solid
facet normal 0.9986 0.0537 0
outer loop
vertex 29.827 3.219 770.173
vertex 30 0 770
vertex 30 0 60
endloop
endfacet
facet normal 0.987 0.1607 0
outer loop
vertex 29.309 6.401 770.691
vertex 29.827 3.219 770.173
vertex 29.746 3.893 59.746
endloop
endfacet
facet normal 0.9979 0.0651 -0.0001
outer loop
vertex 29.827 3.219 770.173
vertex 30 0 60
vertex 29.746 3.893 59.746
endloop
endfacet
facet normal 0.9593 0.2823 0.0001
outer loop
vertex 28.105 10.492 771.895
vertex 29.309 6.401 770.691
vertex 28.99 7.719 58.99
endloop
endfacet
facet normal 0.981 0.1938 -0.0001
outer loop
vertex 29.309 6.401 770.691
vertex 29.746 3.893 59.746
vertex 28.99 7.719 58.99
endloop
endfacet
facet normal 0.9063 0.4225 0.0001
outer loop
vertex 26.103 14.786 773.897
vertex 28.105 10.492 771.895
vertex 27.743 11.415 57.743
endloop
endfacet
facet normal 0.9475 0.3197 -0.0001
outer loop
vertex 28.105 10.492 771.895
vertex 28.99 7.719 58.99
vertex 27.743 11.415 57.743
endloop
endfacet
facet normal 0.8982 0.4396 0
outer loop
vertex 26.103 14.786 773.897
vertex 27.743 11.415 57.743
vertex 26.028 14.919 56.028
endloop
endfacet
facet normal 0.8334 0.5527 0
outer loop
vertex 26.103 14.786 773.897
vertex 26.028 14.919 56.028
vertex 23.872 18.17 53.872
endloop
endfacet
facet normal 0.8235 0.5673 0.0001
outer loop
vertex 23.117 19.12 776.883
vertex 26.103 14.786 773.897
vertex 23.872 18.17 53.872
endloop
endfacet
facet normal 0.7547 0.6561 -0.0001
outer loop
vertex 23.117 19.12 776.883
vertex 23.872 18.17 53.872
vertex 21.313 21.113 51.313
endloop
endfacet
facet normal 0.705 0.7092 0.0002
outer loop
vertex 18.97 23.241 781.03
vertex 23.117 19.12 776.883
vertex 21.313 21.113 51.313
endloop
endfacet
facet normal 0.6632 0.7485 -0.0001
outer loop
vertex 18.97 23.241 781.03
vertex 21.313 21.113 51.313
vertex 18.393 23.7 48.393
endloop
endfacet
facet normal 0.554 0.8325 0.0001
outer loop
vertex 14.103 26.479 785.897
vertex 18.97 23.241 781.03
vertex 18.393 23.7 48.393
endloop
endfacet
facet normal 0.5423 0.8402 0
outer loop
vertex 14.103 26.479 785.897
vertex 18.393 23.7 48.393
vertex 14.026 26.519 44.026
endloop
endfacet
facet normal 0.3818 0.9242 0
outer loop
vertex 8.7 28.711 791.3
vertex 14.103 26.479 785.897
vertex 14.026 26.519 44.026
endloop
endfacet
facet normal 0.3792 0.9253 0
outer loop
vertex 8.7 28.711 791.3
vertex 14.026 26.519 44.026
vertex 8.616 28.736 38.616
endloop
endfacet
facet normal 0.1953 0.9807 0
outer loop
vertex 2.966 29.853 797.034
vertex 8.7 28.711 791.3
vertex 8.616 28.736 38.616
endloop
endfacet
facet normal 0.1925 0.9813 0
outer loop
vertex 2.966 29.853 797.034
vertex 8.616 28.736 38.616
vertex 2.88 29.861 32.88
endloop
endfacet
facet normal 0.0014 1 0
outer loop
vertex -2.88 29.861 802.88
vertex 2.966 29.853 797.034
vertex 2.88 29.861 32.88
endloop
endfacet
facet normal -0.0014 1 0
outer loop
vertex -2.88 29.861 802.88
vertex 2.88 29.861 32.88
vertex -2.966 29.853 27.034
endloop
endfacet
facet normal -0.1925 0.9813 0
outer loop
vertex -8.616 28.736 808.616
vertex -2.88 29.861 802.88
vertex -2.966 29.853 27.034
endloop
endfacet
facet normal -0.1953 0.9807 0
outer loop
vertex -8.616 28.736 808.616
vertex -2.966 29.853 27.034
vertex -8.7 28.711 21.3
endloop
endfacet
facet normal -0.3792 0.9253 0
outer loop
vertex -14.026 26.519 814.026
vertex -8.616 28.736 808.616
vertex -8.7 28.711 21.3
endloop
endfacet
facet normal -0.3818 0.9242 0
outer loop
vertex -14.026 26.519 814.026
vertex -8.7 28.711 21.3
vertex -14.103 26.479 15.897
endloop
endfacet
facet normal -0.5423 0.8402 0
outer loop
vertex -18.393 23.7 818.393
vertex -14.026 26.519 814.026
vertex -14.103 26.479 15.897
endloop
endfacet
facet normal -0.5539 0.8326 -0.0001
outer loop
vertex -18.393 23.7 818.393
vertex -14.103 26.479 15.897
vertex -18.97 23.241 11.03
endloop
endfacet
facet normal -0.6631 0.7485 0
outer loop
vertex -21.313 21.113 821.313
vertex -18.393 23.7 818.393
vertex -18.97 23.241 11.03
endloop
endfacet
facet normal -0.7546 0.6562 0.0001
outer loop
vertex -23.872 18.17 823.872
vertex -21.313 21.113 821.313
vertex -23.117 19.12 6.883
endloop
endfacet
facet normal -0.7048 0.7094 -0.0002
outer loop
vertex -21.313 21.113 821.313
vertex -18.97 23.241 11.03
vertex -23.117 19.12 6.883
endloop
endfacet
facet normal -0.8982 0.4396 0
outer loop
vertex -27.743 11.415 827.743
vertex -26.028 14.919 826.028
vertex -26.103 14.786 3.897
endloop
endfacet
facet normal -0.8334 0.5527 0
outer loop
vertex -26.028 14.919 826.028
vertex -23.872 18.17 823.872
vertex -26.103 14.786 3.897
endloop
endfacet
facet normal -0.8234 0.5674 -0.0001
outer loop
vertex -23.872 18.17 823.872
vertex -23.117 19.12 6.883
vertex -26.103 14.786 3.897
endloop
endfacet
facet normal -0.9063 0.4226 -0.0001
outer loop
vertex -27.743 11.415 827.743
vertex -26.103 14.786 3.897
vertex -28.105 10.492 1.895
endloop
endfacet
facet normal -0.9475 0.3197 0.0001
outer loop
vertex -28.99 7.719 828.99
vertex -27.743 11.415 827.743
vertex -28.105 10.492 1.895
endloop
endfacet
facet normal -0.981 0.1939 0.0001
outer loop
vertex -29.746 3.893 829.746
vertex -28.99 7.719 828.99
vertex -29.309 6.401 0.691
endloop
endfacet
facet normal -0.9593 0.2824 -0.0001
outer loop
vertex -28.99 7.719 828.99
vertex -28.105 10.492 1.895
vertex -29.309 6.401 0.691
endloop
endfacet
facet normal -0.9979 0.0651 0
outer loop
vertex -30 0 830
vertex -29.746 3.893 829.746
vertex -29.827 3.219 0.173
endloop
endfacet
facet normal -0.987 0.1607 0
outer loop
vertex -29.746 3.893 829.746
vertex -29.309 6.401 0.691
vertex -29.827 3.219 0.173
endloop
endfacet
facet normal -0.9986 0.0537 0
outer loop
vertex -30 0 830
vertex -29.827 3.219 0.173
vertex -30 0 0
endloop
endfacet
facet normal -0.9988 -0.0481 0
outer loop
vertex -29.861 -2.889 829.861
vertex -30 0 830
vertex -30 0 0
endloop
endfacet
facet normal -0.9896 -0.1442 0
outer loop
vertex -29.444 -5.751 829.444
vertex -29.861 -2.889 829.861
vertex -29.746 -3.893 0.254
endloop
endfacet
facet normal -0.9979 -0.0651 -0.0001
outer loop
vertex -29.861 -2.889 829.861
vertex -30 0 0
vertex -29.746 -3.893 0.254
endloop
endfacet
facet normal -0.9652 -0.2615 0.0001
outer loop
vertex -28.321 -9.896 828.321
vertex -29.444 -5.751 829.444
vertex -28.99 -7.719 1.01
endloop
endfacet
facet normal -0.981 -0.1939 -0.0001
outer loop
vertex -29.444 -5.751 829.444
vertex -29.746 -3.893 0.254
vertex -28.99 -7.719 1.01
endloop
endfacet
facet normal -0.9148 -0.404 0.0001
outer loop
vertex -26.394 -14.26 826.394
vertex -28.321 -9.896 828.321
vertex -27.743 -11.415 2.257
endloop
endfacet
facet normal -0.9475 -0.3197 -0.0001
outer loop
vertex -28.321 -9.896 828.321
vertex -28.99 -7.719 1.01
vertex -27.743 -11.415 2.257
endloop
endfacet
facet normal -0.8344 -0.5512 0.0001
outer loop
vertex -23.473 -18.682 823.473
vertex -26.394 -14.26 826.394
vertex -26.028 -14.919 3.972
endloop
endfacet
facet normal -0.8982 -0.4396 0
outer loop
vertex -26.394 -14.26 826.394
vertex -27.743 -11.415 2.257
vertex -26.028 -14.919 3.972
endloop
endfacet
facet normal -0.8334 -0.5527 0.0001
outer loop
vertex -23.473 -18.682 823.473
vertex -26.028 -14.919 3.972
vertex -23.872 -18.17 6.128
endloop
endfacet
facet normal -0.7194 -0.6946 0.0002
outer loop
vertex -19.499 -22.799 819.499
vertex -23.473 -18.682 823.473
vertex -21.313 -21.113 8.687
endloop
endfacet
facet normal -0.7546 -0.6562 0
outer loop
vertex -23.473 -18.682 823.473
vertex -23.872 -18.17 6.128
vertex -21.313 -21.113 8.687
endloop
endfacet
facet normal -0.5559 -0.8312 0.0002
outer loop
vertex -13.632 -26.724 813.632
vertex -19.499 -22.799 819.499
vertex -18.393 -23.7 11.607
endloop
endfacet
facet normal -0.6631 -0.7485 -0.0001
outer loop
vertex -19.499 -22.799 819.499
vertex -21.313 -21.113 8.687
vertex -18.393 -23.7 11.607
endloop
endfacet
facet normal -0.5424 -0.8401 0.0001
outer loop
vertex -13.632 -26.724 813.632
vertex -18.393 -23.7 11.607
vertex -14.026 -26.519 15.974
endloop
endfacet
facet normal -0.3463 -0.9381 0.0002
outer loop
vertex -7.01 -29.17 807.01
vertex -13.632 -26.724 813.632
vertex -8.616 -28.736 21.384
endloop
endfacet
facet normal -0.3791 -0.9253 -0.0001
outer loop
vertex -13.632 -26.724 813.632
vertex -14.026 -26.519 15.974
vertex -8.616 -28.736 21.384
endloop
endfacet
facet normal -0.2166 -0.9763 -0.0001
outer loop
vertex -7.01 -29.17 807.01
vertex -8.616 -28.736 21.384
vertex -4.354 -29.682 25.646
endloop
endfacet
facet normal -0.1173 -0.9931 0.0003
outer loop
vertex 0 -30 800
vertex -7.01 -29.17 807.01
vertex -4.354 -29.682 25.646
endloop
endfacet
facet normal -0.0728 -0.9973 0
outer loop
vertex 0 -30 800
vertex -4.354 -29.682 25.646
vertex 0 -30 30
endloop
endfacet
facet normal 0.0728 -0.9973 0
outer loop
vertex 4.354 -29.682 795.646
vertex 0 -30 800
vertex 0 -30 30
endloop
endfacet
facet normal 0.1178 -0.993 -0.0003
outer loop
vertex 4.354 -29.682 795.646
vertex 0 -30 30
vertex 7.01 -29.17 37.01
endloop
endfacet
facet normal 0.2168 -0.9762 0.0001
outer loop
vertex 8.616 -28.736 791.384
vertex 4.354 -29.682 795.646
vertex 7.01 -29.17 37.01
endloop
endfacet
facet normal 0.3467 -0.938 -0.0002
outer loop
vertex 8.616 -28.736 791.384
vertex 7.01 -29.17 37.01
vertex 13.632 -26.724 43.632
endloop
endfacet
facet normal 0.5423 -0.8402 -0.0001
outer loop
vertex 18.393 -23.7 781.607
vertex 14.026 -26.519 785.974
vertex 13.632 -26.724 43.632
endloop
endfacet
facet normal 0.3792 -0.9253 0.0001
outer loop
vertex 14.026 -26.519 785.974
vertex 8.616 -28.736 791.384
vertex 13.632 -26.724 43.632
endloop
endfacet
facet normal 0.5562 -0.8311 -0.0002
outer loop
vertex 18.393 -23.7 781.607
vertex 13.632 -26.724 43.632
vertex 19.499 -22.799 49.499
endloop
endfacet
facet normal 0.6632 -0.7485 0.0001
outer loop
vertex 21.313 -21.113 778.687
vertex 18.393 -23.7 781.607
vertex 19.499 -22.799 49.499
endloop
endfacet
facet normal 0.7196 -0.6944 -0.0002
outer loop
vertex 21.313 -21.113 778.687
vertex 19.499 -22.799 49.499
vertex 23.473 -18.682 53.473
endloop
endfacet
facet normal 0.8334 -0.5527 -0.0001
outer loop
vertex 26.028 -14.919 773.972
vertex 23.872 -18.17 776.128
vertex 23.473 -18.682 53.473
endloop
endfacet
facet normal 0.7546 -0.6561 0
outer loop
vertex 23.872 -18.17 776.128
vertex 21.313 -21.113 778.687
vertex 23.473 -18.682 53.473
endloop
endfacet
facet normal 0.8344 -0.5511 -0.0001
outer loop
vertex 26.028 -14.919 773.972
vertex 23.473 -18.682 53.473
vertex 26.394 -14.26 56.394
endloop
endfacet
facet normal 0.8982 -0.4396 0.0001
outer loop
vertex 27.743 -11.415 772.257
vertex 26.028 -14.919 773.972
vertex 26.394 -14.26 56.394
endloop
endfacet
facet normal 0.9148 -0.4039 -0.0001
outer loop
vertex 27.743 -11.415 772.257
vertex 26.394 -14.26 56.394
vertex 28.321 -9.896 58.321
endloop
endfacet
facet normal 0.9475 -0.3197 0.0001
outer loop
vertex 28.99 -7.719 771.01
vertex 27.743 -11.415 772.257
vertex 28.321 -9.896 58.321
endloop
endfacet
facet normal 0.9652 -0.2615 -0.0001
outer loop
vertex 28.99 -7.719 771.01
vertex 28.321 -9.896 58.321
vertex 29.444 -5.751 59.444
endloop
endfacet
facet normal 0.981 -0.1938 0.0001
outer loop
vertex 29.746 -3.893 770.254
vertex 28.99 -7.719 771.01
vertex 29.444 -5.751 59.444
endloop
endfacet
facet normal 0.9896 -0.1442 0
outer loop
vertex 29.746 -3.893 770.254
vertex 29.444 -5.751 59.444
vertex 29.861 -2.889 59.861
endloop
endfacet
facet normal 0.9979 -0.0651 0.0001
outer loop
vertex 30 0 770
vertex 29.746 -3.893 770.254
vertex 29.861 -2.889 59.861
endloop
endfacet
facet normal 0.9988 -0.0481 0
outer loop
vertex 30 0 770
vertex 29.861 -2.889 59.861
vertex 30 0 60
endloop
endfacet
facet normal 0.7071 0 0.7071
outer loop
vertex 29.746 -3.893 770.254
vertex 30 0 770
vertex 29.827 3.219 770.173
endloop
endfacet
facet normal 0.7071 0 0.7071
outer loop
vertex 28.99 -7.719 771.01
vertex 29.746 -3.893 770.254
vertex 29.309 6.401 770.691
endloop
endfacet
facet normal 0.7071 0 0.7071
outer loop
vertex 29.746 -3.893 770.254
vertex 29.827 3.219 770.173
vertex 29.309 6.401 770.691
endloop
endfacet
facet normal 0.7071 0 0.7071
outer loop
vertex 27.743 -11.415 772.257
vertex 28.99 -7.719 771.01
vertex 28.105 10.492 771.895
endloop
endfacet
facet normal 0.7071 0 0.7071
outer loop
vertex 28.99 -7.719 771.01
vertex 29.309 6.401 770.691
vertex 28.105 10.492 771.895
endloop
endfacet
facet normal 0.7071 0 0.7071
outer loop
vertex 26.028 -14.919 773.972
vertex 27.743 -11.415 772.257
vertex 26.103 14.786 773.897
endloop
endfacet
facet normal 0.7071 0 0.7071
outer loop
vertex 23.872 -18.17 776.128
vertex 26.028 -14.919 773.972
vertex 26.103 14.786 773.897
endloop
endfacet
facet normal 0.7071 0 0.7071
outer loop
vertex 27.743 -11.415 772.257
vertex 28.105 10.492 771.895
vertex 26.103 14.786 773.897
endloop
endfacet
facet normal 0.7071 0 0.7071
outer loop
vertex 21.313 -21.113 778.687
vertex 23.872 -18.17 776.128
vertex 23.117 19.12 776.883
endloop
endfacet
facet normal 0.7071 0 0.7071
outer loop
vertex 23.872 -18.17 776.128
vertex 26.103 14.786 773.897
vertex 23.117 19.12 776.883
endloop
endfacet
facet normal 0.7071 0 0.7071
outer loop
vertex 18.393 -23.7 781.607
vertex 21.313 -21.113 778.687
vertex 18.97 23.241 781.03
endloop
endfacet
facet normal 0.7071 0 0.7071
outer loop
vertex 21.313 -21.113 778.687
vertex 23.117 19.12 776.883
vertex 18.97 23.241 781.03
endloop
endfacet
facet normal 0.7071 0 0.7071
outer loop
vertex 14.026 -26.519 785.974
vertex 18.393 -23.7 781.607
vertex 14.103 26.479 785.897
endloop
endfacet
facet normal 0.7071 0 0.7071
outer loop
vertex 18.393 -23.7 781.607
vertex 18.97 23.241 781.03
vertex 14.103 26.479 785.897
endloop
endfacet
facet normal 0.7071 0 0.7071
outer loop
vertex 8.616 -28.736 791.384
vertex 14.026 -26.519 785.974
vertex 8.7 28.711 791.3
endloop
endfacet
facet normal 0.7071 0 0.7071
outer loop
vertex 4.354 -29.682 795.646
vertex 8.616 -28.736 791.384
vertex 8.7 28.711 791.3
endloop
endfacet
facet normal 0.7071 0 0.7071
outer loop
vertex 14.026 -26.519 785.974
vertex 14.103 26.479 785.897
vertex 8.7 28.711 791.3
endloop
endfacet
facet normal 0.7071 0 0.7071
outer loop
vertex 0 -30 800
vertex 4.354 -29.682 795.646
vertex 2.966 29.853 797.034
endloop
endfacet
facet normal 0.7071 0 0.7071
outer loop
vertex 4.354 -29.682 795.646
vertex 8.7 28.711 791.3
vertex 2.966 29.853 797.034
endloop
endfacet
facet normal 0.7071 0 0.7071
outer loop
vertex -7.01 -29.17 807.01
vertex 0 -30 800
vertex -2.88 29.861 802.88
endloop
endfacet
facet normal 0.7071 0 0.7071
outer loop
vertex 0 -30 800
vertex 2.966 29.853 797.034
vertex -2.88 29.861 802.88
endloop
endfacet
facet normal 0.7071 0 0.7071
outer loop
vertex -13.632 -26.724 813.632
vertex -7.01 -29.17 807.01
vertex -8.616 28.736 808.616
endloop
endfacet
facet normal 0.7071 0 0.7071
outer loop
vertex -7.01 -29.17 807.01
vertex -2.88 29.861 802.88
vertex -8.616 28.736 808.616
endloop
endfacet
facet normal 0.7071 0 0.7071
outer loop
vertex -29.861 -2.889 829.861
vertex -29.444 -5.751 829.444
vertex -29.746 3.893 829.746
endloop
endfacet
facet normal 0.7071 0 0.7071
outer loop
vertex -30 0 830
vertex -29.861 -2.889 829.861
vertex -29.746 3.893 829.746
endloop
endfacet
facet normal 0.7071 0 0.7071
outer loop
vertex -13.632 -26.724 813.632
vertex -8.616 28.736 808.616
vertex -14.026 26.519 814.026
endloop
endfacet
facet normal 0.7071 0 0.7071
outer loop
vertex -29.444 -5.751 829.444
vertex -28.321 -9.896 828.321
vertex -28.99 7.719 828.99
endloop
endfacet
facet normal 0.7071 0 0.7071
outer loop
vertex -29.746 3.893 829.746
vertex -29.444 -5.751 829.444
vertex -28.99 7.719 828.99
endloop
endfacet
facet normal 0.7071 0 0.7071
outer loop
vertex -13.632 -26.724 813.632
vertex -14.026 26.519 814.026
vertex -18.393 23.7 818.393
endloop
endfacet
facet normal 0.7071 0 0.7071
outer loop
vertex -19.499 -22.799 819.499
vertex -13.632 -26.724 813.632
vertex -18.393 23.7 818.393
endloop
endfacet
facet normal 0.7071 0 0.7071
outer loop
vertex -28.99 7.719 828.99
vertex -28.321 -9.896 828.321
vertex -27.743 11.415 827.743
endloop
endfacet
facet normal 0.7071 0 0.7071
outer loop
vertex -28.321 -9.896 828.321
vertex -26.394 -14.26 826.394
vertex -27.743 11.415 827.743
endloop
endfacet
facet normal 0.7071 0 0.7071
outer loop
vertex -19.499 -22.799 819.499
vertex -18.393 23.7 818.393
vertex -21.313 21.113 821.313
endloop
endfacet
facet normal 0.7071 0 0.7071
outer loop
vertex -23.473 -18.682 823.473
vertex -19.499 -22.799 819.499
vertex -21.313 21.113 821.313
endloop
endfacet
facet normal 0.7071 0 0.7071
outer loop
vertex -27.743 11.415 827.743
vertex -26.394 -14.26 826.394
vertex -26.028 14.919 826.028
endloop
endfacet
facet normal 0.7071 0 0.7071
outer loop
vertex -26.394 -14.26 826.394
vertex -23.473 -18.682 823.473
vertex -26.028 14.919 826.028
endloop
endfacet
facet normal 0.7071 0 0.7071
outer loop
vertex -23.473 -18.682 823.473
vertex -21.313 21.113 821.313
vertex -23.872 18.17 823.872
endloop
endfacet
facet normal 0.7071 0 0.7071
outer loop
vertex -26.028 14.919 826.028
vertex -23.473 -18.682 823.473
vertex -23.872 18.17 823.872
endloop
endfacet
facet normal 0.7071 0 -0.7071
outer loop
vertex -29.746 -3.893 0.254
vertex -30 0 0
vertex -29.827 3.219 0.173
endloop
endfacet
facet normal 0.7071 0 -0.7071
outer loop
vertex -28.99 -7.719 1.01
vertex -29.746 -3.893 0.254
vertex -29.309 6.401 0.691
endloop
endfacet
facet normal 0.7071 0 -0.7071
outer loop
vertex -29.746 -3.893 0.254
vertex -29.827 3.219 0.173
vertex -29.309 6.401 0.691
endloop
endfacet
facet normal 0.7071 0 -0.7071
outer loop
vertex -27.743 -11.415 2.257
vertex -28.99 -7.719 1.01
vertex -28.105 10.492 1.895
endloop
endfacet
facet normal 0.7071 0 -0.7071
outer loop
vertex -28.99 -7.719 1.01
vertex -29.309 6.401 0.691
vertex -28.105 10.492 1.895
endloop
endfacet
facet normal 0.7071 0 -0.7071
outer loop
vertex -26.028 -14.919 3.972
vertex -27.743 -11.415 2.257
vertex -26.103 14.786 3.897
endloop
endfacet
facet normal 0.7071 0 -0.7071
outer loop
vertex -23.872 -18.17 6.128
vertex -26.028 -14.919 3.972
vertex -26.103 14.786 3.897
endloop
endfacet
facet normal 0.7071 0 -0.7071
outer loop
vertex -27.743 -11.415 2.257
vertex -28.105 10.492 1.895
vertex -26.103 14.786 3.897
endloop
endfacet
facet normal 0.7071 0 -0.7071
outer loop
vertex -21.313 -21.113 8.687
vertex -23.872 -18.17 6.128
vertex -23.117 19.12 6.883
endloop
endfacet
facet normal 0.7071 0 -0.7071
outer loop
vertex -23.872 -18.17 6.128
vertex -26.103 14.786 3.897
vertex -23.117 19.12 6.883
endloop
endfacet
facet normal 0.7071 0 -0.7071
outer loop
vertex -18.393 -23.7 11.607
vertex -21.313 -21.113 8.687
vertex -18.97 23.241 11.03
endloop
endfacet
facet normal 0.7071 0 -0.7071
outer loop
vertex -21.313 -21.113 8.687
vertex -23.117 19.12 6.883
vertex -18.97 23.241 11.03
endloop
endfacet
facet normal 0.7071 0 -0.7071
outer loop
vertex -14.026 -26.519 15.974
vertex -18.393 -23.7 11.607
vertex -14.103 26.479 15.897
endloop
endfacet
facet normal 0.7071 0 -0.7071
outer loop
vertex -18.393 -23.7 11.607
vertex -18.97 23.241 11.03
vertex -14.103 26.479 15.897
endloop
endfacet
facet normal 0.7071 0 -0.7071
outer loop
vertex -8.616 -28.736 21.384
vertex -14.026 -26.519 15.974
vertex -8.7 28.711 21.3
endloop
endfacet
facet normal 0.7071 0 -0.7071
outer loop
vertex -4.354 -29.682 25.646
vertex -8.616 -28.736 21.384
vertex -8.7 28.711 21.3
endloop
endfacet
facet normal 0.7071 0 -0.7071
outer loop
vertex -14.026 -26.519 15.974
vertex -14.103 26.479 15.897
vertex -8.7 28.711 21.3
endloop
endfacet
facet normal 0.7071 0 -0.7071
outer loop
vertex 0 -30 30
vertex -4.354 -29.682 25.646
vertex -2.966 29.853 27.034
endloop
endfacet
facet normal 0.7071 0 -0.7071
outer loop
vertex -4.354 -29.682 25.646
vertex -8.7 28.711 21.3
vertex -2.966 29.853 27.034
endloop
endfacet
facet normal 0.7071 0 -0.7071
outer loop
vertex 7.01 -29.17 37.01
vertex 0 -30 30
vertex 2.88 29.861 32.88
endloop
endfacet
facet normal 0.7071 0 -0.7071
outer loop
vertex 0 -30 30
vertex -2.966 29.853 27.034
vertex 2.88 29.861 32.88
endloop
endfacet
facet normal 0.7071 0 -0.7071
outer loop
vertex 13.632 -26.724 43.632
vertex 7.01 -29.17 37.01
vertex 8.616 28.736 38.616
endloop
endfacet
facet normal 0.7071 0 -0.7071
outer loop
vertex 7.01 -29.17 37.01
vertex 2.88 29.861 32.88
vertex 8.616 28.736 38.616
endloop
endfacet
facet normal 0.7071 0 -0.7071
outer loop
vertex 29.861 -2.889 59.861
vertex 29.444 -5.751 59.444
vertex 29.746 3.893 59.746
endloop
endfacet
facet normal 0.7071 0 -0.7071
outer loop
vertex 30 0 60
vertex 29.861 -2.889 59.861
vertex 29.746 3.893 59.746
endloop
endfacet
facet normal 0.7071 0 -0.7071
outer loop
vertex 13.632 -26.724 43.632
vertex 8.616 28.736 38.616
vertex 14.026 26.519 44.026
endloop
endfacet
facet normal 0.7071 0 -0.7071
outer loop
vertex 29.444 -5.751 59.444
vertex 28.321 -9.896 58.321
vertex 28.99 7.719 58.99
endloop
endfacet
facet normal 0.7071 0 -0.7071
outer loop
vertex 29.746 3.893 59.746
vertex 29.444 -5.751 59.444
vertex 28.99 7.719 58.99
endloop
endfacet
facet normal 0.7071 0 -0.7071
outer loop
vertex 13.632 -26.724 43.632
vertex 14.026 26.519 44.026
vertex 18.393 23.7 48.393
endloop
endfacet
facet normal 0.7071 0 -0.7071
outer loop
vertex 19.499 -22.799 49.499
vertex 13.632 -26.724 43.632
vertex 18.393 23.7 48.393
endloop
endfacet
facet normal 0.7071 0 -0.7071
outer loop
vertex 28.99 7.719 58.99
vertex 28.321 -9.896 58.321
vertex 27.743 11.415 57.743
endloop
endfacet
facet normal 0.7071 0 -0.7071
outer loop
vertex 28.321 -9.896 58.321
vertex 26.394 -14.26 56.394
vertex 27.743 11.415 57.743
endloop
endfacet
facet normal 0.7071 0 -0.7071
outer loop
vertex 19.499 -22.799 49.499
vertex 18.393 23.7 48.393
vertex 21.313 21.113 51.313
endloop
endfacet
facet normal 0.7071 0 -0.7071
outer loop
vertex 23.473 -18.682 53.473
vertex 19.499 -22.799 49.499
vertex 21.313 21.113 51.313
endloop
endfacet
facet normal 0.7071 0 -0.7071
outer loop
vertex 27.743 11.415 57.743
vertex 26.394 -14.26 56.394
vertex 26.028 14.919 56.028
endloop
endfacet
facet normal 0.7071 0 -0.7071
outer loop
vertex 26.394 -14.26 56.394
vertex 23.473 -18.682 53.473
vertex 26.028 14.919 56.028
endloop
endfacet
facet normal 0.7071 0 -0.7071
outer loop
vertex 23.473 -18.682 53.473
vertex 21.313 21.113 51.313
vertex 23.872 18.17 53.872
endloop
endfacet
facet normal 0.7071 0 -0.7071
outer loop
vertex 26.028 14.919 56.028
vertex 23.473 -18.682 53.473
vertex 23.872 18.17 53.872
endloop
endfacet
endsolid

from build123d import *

# Parameters (mm, degrees)
SKETCH1_R           = 30
BOSS_EXTRUDE2_DEPTH = 830
CUT_EXTRUDE4_DEPTH  = 70
CUT_EXTRUDE5_DEPTH  = 70


with BuildPart() as part:
    # Sketch1 → Boss-Extrude2 (new body)
    with BuildSketch(Plane.XY):
        Circle(SKETCH1_R)
    extrude(amount=BOSS_EXTRUDE2_DEPTH)

    # Sketch3 → Cut-Extrude4 (cut)
    with BuildSketch(Plane(origin=(0, 40, 0), x_dir=(1, 0, 0), z_dir=(0, 1, 0))):
        Polygon((-30, 0), (30, -60), (30, 0), align=None)
    extrude(amount=-CUT_EXTRUDE4_DEPTH, mode=Mode.SUBTRACT)

    # Sketch4 → Cut-Extrude5 (cut)
    with BuildSketch(Plane(origin=(0, 40, 0), x_dir=(1, 0, 0), z_dir=(0, 1, 0))):
        Polygon((-30, -830), (30, -830), (30, -770), align=None)
    extrude(amount=-CUT_EXTRUDE5_DEPTH, mode=Mode.SUBTRACT)


solid = part.part
